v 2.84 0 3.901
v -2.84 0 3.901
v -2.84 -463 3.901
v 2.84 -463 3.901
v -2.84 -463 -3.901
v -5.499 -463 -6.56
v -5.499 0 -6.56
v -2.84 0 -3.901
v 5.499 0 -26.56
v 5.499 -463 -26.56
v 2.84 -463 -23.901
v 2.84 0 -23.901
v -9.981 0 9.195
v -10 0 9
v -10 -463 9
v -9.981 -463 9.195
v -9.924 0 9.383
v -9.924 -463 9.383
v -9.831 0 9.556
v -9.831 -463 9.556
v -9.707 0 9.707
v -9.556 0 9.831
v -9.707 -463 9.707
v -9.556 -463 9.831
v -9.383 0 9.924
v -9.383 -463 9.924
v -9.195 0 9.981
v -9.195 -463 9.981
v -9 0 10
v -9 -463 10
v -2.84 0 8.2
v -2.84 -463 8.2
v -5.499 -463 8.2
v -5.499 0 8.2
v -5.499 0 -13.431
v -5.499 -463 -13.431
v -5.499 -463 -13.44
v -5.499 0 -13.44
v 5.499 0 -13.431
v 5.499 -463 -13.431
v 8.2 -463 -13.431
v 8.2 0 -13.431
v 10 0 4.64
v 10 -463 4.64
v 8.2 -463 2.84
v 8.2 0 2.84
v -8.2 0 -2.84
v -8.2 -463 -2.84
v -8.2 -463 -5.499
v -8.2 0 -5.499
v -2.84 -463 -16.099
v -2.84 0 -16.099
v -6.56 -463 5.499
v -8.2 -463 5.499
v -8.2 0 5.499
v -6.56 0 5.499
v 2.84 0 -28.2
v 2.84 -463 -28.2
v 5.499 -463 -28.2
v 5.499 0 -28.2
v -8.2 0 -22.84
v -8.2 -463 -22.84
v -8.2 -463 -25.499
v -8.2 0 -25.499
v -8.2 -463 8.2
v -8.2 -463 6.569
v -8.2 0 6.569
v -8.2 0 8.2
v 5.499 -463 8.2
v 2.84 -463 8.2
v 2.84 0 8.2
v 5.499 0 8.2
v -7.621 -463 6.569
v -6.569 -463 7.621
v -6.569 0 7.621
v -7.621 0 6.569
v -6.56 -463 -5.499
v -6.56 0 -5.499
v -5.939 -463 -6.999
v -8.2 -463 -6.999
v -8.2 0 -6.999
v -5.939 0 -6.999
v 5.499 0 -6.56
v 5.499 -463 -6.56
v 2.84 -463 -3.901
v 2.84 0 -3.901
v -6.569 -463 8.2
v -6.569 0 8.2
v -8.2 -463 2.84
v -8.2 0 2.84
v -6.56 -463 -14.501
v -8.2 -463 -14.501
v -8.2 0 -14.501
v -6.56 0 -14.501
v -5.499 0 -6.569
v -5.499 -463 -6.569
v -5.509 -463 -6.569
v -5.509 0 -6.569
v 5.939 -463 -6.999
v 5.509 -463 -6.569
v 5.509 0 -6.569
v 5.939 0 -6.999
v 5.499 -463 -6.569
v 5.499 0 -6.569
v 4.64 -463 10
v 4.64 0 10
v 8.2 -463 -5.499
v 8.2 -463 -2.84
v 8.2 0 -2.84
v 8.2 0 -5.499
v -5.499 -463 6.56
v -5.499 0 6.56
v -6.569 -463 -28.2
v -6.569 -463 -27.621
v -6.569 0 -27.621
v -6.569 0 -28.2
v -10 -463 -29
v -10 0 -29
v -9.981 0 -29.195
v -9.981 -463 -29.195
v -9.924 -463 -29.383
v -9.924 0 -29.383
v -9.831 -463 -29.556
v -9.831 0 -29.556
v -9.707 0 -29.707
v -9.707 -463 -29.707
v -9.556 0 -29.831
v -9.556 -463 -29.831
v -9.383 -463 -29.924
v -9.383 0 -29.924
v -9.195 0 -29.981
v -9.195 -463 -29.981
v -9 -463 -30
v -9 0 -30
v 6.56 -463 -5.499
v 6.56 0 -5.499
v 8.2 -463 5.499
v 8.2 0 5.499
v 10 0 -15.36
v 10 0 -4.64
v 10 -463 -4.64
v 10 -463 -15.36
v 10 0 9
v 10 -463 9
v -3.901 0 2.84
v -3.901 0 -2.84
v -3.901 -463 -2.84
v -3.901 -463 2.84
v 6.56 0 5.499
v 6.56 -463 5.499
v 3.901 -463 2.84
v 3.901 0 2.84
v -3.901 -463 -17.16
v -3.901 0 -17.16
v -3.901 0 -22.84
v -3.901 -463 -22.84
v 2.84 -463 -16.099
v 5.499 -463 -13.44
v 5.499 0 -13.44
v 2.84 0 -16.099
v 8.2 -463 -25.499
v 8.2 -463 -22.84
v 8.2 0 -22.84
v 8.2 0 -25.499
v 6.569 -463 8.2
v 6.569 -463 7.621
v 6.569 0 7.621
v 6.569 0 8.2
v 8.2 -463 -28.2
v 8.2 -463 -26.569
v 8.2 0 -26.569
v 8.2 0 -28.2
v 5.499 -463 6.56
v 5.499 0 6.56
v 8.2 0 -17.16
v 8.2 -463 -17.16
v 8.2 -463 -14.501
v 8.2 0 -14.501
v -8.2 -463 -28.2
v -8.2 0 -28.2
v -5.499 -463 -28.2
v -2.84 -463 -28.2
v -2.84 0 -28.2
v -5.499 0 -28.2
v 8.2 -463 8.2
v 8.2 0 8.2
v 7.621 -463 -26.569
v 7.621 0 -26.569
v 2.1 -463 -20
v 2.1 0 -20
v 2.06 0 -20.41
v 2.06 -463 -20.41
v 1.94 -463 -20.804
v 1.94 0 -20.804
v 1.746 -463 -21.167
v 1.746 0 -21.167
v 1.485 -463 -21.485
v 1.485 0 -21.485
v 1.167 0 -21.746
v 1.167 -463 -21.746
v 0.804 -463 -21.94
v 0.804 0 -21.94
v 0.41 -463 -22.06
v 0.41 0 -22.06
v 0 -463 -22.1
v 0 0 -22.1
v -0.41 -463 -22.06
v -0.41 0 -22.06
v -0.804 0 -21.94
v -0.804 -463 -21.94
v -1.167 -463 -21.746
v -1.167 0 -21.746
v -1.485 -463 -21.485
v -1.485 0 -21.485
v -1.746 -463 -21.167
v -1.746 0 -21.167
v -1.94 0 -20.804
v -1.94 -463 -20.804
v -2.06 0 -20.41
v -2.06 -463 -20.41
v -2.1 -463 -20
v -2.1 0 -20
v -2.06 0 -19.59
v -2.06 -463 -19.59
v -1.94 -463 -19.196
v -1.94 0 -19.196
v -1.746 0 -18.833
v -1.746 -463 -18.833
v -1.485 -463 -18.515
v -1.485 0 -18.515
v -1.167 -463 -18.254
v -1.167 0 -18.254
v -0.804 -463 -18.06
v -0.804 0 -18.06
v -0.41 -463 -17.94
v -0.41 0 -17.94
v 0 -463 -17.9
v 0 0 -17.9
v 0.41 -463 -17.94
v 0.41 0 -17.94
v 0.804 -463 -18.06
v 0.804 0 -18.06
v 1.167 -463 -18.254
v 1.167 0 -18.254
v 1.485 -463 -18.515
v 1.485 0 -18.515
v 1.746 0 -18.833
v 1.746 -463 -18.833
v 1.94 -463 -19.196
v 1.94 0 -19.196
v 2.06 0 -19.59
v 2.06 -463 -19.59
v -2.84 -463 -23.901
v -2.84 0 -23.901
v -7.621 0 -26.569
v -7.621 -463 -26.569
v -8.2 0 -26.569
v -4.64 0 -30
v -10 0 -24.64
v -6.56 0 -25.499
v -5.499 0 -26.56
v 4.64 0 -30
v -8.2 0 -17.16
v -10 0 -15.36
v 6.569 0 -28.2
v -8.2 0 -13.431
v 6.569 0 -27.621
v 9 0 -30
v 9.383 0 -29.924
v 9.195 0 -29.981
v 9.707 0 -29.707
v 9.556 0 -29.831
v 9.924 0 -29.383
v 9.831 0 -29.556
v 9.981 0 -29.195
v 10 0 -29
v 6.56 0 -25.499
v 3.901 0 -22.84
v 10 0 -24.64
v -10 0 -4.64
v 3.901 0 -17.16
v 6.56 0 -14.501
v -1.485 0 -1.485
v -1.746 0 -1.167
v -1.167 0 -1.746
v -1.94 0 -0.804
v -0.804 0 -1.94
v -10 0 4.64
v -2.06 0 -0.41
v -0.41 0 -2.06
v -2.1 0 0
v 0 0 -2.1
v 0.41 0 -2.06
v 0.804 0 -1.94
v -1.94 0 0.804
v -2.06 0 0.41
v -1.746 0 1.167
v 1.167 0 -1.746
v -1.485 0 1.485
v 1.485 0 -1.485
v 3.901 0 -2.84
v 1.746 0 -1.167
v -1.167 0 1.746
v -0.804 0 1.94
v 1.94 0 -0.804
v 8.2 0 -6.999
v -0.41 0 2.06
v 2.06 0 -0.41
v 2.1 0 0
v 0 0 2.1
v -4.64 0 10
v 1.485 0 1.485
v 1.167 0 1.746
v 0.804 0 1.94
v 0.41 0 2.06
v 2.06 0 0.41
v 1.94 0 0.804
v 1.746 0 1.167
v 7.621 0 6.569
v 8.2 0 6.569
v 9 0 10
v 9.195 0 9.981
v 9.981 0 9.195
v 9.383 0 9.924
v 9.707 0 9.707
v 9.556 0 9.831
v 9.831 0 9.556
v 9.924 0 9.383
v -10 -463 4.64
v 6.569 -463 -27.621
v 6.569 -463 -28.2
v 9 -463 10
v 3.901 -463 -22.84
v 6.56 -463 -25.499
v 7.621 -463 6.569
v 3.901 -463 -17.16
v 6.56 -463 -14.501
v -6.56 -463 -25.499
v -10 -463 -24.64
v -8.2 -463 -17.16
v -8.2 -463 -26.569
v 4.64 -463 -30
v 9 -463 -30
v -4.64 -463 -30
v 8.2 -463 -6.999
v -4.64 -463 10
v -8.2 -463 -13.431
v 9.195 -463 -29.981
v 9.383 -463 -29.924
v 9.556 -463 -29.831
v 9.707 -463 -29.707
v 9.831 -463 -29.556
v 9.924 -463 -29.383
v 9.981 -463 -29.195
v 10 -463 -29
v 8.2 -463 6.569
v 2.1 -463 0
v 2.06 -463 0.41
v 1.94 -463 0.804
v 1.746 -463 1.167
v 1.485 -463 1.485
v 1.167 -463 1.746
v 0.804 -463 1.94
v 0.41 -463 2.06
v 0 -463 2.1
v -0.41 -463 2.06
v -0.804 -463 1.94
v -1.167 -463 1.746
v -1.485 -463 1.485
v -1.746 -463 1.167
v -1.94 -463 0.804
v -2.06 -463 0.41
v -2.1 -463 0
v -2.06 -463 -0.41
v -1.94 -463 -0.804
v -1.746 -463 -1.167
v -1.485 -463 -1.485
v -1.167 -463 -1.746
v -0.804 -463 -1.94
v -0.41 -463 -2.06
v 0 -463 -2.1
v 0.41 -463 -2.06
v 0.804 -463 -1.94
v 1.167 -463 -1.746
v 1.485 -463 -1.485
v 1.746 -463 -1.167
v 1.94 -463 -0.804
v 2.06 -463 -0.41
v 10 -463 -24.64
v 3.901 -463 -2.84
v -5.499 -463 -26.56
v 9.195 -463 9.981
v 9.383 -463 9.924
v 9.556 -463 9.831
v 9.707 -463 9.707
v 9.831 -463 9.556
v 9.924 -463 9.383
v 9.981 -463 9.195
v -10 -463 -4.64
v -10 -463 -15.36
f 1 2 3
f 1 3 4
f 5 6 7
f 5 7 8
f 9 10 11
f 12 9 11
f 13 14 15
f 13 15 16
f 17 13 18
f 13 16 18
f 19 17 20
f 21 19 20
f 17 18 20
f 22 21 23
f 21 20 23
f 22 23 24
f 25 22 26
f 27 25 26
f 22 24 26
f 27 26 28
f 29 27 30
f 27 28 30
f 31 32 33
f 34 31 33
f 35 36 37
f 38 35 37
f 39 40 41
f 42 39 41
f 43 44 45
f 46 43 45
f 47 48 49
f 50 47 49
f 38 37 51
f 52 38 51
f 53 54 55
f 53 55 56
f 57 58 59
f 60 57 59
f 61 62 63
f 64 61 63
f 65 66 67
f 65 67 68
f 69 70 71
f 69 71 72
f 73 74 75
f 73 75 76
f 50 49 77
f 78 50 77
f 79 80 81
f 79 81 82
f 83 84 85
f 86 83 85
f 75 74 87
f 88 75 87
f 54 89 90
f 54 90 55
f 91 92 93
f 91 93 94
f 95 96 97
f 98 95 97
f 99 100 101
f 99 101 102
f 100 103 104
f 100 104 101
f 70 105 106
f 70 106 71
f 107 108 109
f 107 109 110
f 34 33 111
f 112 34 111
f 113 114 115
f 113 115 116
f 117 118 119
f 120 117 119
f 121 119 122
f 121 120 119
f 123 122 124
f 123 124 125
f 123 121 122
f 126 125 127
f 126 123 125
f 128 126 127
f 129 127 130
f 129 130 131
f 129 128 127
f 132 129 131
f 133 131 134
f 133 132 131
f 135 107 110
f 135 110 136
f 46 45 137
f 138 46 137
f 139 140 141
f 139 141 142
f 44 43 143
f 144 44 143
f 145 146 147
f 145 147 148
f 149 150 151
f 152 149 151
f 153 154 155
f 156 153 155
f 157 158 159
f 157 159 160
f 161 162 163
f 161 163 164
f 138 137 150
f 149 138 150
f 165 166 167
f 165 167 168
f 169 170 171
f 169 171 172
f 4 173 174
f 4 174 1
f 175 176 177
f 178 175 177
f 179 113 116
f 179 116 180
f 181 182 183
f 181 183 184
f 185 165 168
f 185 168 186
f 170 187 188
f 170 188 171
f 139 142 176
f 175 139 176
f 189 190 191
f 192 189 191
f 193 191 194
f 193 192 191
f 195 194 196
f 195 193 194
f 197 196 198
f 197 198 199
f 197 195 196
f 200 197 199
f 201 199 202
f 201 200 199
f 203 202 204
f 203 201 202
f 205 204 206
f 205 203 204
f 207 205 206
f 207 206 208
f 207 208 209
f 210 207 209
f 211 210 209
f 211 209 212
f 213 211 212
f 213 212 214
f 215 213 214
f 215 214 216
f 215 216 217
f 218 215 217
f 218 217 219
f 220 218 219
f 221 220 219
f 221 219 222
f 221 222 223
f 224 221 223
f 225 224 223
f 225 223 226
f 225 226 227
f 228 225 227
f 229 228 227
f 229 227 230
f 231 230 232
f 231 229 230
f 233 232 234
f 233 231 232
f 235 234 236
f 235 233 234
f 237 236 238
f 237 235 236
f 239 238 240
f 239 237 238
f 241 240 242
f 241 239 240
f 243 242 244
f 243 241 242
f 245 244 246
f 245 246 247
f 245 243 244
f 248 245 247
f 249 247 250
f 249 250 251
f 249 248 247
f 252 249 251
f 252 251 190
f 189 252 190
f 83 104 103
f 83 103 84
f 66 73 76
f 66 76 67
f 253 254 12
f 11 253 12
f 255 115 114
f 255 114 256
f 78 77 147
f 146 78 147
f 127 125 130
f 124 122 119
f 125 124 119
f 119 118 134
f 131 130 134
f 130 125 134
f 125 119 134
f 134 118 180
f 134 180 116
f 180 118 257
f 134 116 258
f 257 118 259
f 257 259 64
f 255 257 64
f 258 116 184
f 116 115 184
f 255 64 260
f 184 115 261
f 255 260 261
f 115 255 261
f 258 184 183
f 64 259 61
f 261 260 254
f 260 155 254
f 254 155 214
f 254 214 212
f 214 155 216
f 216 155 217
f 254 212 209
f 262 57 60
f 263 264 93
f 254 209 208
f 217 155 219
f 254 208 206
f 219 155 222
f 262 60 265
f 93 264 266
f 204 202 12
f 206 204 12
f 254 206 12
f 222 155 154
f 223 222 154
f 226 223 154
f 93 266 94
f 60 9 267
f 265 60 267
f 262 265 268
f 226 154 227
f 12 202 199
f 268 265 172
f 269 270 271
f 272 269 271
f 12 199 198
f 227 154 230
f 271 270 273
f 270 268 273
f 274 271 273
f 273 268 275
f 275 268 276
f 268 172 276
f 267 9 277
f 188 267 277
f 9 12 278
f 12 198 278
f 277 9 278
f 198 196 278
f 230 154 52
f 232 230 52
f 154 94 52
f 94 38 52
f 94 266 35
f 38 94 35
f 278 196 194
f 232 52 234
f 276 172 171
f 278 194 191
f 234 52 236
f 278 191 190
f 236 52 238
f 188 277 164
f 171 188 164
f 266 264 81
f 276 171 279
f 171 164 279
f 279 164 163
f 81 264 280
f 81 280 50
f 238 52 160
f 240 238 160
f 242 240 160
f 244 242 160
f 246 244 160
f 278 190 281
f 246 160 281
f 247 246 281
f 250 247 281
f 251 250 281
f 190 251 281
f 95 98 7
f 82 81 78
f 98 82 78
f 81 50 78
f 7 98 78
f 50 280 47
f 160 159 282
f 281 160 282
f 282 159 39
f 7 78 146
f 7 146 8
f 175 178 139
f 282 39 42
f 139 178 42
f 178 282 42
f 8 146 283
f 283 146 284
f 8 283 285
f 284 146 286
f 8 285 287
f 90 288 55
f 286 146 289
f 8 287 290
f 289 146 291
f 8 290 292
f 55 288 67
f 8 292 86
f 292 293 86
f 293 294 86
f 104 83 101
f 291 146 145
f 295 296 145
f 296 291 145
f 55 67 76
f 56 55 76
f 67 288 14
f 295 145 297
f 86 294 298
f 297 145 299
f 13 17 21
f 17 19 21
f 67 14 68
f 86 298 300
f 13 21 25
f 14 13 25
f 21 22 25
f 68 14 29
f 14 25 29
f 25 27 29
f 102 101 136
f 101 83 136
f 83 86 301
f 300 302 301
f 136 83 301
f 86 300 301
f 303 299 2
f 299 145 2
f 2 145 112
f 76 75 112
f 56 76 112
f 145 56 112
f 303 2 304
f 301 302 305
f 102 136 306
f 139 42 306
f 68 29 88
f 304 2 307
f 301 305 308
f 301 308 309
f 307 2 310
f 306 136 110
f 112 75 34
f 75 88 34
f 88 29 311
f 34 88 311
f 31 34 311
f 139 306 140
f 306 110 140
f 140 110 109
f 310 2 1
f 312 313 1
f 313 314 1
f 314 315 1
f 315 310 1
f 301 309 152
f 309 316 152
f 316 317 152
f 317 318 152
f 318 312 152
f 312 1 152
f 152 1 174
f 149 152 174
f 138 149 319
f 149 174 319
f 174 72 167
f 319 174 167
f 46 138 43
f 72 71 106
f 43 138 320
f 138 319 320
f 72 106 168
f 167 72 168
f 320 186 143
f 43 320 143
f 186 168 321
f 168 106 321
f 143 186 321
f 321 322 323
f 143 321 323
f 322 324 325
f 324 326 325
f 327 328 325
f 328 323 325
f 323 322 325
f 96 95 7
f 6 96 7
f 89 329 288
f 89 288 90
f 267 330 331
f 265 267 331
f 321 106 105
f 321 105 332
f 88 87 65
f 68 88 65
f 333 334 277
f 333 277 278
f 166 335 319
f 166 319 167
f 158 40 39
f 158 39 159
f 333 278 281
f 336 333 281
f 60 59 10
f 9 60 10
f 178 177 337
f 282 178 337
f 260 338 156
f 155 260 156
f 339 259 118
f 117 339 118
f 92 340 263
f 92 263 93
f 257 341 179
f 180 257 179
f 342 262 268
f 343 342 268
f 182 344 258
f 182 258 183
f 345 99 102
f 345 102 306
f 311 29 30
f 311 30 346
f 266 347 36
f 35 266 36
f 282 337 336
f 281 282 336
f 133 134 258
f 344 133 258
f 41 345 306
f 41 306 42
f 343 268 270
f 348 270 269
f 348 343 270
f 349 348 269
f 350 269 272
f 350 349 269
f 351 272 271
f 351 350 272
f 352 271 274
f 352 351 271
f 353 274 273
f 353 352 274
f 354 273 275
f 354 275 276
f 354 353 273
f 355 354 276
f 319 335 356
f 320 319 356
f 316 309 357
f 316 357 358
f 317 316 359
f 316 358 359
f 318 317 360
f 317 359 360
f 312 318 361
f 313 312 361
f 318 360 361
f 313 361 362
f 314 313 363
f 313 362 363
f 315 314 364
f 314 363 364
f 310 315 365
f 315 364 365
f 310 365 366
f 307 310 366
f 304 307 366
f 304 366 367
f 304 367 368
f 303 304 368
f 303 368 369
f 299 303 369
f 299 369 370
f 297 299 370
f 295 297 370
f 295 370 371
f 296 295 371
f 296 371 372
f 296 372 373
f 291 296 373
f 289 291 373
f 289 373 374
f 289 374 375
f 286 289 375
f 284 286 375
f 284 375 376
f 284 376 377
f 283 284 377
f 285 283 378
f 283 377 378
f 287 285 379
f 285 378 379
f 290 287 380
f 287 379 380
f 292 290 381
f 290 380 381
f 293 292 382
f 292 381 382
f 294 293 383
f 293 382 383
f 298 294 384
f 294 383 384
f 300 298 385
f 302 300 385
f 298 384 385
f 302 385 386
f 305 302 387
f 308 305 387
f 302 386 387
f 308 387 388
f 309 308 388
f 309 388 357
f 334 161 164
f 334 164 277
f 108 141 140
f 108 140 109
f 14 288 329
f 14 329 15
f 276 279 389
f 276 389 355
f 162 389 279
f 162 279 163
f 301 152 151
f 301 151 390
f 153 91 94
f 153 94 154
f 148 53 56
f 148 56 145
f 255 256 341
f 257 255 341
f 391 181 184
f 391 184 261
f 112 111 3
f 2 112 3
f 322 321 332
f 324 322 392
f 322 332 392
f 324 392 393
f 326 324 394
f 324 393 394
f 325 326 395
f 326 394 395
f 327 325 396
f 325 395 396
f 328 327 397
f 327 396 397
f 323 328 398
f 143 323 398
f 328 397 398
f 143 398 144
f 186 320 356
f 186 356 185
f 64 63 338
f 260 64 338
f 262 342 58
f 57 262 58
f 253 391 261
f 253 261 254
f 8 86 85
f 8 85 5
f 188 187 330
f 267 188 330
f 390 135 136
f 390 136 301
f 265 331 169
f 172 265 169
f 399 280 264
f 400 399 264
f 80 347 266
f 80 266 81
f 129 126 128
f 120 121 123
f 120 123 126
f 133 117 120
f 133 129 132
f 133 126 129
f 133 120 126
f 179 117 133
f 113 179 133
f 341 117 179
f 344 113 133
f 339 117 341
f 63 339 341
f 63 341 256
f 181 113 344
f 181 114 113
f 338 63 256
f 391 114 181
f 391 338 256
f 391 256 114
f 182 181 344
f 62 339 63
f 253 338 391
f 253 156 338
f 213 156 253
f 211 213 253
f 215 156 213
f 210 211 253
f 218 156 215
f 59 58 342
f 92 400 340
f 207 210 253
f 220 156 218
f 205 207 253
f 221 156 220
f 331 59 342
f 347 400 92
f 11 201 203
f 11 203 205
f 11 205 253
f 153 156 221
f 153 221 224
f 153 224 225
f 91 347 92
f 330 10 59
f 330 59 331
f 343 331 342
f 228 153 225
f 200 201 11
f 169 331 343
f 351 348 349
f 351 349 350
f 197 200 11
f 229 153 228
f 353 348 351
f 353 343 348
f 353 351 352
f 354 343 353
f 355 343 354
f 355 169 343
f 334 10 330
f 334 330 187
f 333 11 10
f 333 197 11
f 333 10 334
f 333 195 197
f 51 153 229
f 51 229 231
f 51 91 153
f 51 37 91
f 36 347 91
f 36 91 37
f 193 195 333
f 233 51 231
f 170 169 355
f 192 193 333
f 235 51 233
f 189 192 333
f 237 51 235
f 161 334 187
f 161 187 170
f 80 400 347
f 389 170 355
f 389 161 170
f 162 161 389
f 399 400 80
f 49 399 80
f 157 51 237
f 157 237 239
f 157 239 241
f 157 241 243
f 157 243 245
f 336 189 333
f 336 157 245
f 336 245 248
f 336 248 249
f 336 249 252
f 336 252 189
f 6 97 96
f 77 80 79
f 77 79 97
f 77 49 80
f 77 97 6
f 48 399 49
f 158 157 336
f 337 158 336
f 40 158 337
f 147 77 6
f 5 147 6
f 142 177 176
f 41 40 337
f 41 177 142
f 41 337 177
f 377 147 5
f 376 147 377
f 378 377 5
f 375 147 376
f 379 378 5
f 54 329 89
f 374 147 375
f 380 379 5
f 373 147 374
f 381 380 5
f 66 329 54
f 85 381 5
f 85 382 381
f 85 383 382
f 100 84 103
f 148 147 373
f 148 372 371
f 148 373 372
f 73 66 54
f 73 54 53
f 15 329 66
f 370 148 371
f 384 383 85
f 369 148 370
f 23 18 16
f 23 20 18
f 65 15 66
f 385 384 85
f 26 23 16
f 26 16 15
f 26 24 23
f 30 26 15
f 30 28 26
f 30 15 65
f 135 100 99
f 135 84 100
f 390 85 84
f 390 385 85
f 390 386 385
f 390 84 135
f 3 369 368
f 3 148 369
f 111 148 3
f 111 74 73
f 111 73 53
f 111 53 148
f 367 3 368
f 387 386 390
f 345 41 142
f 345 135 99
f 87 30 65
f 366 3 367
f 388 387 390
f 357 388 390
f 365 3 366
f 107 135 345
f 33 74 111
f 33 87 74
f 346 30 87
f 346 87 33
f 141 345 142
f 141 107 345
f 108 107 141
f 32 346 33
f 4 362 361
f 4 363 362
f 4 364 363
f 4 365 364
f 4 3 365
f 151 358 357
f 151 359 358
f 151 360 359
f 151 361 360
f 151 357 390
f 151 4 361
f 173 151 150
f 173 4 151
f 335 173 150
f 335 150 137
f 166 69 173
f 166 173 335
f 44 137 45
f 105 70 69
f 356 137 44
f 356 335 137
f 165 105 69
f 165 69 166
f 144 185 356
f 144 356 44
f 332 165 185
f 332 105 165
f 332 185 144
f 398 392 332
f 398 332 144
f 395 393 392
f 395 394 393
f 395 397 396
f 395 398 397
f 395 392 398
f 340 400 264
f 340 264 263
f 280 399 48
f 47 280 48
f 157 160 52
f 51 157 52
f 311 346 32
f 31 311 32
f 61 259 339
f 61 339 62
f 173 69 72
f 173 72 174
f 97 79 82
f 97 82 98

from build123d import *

# Parameters (mm, degrees)
F0_W             = 20
F0_H             = 20
F1_DEPTH         = 463
F2_R             = 2.1
F3_DEPTH         = 463.001
F4_R             = 1
F6_DEPTH         = 463.001
F6_COPIES3_COUNT = 2
F6_COPIES3_ANGLE = 90
F6_COPIES4_COUNT = 2
F6_COPIES4_ANGLE = 270
F6_COPIES6_COUNT = 2
F9_W             = 16.4
F9_H             = 6.8613203436
F10_DEPTH        = 463.001
F12_DEPTH        = 463


# Not quite as in the source:
# - a pattern or mirror of a feature is missing from the dataset's text; its kind, count and spacing are read off the source's solid


with BuildPart() as f1:
    # F0 (on Front) → F1 (new body)
    with BuildSketch(Plane.XZ):
        Rectangle(F0_W, F0_H)
    extrude(amount=F1_DEPTH)

    # F2 (on face) → F3 (cut, through all)
    with BuildSketch(Plane.XZ.offset(463)):
        Circle(F2_R)
    extrude(amount=-F3_DEPTH, mode=Mode.SUBTRACT)

    # F4
    f4_edges = [f1.edges().sort_by_distance(p)[0] for p in [
        (-10, -231.5, 10),
        (10, -231.5, 10),
    ]]
    fillet(f4_edges, radius=F4_R)

    # F5 (on face) → F6 (cut, through all)
    with BuildSketch(Plane.XZ.offset(463)):
        Polygon((0, 3.9006601718), (0, 10), (-2.84, 10), (-4.64, 10), (-2.84, 8.2), (-5.4993398282, 8.2), (-5.4993398282, 6.56), (-2.84, 3.9006601718), align=None)
        Polygon((-6.5693398282, 8.2), (-8.2, 8.2), (-7.0953059148, 7.0953059148), (-6.5693398282, 7.6212720014), align=None)
    f6 = extrude(amount=-F6_DEPTH, mode=Mode.SUBTRACT)

    # F6_copies: F6 across plane
    add(f6.mirror(Plane(origin=(0, 0, 0), x_dir=(-0.7071067812, 0, -0.7071067812), z_dir=(0.7071067812, 0, -0.7071067812))), mode=Mode.SUBTRACT)

    # F6_copies1: F6 across plane
    add(f6.mirror(Plane(origin=(0, 0, 0), x_dir=(0.7071067812, 0, -0.7071067812), z_dir=(-0.7071067812, 0, -0.7071067812))), mode=Mode.SUBTRACT)

    # F6_copies2: F6 across plane
    add(f6.mirror(Plane(origin=(0, 0, 0), x_dir=(0, 0, 1), z_dir=(1, 0, 0))), mode=Mode.SUBTRACT)

    # F6_copies3: F6 ×2 about axis
    f6_copies3_axis = Axis((0, 0, 0), (0, 1, 0))
    for i in range(1, F6_COPIES3_COUNT):
        add(f6.rotate(f6_copies3_axis, i * F6_COPIES3_ANGLE / (F6_COPIES3_COUNT - 1)), mode=Mode.SUBTRACT)

    # F6_copies4: F6 ×2 about axis
    f6_copies4_axis = Axis((0, 0, 0), (0, 1, 0))
    for i in range(1, F6_COPIES4_COUNT):
        add(f6.rotate(f6_copies4_axis, i * F6_COPIES4_ANGLE / (F6_COPIES4_COUNT - 1)), mode=Mode.SUBTRACT)

    # F6_copies5: F6 across plane
    add(f6.mirror(Plane(origin=(0, 0, 0), x_dir=(-1, 0, 0), z_dir=(0, 0, -1))), mode=Mode.SUBTRACT)

    # F6_copies6: F6 ×2 about axis
    f6_copies6_axis = Axis((0, 0, 0), (0, 1, 0))
    for i in range(1, F6_COPIES6_COUNT):
        add(f6.rotate(f6_copies6_axis, i * 360 / F6_COPIES6_COUNT), mode=Mode.SUBTRACT)

    # F8: F1 across face


with BuildPart() as f1_1:
    add(f1.part)
    add(f1.part.mirror(Plane(origin=(-7.32, -231.5, -10), x_dir=(1, 0, 0), z_dir=(0, 0, -1))))

    # F9 (on face) → F10 (cut, through all)
    with BuildSketch(Plane.XZ.offset(463)):
        with Locations((0, -10)):
            Rectangle(F9_W, F9_H)
    extrude(amount=-F10_DEPTH, mode=Mode.SUBTRACT)

    # F11 (on face) → F12 (join, through all)
    with BuildSketch(Plane.XZ.offset(463)):
        with BuildLine():
            ThreePointArc((-9, -10), (-9.7071067812, -9.7071067812), (-10, -9))
            Line((-10, -9), (-10, -11))
            ThreePointArc((-10, -11), (-9.7071067812, -10.2928932188), (-9, -10))
        make_face()
        with BuildLine():
            ThreePointArc((10, -9), (9.7071067812, -9.7071067812), (9, -10))
            ThreePointArc((9, -10), (9.7071067812, -10.2928932188), (10, -11))
            Line((10, -11), (10, -9))
        make_face()
        Polygon((5.9386796564, -6.9993398282), (8.2, -6.9993398282), (8.2, -6.5693398282), (5.5086796564, -6.5693398282), align=None)
        Polygon((-8.2, -6.5693398282), (-8.2, -6.9993398282), (-5.9386796564, -6.9993398282), (-5.5086796564, -6.5693398282), align=None)
    extrude(amount=-F12_DEPTH)


solid = f1_1.part
